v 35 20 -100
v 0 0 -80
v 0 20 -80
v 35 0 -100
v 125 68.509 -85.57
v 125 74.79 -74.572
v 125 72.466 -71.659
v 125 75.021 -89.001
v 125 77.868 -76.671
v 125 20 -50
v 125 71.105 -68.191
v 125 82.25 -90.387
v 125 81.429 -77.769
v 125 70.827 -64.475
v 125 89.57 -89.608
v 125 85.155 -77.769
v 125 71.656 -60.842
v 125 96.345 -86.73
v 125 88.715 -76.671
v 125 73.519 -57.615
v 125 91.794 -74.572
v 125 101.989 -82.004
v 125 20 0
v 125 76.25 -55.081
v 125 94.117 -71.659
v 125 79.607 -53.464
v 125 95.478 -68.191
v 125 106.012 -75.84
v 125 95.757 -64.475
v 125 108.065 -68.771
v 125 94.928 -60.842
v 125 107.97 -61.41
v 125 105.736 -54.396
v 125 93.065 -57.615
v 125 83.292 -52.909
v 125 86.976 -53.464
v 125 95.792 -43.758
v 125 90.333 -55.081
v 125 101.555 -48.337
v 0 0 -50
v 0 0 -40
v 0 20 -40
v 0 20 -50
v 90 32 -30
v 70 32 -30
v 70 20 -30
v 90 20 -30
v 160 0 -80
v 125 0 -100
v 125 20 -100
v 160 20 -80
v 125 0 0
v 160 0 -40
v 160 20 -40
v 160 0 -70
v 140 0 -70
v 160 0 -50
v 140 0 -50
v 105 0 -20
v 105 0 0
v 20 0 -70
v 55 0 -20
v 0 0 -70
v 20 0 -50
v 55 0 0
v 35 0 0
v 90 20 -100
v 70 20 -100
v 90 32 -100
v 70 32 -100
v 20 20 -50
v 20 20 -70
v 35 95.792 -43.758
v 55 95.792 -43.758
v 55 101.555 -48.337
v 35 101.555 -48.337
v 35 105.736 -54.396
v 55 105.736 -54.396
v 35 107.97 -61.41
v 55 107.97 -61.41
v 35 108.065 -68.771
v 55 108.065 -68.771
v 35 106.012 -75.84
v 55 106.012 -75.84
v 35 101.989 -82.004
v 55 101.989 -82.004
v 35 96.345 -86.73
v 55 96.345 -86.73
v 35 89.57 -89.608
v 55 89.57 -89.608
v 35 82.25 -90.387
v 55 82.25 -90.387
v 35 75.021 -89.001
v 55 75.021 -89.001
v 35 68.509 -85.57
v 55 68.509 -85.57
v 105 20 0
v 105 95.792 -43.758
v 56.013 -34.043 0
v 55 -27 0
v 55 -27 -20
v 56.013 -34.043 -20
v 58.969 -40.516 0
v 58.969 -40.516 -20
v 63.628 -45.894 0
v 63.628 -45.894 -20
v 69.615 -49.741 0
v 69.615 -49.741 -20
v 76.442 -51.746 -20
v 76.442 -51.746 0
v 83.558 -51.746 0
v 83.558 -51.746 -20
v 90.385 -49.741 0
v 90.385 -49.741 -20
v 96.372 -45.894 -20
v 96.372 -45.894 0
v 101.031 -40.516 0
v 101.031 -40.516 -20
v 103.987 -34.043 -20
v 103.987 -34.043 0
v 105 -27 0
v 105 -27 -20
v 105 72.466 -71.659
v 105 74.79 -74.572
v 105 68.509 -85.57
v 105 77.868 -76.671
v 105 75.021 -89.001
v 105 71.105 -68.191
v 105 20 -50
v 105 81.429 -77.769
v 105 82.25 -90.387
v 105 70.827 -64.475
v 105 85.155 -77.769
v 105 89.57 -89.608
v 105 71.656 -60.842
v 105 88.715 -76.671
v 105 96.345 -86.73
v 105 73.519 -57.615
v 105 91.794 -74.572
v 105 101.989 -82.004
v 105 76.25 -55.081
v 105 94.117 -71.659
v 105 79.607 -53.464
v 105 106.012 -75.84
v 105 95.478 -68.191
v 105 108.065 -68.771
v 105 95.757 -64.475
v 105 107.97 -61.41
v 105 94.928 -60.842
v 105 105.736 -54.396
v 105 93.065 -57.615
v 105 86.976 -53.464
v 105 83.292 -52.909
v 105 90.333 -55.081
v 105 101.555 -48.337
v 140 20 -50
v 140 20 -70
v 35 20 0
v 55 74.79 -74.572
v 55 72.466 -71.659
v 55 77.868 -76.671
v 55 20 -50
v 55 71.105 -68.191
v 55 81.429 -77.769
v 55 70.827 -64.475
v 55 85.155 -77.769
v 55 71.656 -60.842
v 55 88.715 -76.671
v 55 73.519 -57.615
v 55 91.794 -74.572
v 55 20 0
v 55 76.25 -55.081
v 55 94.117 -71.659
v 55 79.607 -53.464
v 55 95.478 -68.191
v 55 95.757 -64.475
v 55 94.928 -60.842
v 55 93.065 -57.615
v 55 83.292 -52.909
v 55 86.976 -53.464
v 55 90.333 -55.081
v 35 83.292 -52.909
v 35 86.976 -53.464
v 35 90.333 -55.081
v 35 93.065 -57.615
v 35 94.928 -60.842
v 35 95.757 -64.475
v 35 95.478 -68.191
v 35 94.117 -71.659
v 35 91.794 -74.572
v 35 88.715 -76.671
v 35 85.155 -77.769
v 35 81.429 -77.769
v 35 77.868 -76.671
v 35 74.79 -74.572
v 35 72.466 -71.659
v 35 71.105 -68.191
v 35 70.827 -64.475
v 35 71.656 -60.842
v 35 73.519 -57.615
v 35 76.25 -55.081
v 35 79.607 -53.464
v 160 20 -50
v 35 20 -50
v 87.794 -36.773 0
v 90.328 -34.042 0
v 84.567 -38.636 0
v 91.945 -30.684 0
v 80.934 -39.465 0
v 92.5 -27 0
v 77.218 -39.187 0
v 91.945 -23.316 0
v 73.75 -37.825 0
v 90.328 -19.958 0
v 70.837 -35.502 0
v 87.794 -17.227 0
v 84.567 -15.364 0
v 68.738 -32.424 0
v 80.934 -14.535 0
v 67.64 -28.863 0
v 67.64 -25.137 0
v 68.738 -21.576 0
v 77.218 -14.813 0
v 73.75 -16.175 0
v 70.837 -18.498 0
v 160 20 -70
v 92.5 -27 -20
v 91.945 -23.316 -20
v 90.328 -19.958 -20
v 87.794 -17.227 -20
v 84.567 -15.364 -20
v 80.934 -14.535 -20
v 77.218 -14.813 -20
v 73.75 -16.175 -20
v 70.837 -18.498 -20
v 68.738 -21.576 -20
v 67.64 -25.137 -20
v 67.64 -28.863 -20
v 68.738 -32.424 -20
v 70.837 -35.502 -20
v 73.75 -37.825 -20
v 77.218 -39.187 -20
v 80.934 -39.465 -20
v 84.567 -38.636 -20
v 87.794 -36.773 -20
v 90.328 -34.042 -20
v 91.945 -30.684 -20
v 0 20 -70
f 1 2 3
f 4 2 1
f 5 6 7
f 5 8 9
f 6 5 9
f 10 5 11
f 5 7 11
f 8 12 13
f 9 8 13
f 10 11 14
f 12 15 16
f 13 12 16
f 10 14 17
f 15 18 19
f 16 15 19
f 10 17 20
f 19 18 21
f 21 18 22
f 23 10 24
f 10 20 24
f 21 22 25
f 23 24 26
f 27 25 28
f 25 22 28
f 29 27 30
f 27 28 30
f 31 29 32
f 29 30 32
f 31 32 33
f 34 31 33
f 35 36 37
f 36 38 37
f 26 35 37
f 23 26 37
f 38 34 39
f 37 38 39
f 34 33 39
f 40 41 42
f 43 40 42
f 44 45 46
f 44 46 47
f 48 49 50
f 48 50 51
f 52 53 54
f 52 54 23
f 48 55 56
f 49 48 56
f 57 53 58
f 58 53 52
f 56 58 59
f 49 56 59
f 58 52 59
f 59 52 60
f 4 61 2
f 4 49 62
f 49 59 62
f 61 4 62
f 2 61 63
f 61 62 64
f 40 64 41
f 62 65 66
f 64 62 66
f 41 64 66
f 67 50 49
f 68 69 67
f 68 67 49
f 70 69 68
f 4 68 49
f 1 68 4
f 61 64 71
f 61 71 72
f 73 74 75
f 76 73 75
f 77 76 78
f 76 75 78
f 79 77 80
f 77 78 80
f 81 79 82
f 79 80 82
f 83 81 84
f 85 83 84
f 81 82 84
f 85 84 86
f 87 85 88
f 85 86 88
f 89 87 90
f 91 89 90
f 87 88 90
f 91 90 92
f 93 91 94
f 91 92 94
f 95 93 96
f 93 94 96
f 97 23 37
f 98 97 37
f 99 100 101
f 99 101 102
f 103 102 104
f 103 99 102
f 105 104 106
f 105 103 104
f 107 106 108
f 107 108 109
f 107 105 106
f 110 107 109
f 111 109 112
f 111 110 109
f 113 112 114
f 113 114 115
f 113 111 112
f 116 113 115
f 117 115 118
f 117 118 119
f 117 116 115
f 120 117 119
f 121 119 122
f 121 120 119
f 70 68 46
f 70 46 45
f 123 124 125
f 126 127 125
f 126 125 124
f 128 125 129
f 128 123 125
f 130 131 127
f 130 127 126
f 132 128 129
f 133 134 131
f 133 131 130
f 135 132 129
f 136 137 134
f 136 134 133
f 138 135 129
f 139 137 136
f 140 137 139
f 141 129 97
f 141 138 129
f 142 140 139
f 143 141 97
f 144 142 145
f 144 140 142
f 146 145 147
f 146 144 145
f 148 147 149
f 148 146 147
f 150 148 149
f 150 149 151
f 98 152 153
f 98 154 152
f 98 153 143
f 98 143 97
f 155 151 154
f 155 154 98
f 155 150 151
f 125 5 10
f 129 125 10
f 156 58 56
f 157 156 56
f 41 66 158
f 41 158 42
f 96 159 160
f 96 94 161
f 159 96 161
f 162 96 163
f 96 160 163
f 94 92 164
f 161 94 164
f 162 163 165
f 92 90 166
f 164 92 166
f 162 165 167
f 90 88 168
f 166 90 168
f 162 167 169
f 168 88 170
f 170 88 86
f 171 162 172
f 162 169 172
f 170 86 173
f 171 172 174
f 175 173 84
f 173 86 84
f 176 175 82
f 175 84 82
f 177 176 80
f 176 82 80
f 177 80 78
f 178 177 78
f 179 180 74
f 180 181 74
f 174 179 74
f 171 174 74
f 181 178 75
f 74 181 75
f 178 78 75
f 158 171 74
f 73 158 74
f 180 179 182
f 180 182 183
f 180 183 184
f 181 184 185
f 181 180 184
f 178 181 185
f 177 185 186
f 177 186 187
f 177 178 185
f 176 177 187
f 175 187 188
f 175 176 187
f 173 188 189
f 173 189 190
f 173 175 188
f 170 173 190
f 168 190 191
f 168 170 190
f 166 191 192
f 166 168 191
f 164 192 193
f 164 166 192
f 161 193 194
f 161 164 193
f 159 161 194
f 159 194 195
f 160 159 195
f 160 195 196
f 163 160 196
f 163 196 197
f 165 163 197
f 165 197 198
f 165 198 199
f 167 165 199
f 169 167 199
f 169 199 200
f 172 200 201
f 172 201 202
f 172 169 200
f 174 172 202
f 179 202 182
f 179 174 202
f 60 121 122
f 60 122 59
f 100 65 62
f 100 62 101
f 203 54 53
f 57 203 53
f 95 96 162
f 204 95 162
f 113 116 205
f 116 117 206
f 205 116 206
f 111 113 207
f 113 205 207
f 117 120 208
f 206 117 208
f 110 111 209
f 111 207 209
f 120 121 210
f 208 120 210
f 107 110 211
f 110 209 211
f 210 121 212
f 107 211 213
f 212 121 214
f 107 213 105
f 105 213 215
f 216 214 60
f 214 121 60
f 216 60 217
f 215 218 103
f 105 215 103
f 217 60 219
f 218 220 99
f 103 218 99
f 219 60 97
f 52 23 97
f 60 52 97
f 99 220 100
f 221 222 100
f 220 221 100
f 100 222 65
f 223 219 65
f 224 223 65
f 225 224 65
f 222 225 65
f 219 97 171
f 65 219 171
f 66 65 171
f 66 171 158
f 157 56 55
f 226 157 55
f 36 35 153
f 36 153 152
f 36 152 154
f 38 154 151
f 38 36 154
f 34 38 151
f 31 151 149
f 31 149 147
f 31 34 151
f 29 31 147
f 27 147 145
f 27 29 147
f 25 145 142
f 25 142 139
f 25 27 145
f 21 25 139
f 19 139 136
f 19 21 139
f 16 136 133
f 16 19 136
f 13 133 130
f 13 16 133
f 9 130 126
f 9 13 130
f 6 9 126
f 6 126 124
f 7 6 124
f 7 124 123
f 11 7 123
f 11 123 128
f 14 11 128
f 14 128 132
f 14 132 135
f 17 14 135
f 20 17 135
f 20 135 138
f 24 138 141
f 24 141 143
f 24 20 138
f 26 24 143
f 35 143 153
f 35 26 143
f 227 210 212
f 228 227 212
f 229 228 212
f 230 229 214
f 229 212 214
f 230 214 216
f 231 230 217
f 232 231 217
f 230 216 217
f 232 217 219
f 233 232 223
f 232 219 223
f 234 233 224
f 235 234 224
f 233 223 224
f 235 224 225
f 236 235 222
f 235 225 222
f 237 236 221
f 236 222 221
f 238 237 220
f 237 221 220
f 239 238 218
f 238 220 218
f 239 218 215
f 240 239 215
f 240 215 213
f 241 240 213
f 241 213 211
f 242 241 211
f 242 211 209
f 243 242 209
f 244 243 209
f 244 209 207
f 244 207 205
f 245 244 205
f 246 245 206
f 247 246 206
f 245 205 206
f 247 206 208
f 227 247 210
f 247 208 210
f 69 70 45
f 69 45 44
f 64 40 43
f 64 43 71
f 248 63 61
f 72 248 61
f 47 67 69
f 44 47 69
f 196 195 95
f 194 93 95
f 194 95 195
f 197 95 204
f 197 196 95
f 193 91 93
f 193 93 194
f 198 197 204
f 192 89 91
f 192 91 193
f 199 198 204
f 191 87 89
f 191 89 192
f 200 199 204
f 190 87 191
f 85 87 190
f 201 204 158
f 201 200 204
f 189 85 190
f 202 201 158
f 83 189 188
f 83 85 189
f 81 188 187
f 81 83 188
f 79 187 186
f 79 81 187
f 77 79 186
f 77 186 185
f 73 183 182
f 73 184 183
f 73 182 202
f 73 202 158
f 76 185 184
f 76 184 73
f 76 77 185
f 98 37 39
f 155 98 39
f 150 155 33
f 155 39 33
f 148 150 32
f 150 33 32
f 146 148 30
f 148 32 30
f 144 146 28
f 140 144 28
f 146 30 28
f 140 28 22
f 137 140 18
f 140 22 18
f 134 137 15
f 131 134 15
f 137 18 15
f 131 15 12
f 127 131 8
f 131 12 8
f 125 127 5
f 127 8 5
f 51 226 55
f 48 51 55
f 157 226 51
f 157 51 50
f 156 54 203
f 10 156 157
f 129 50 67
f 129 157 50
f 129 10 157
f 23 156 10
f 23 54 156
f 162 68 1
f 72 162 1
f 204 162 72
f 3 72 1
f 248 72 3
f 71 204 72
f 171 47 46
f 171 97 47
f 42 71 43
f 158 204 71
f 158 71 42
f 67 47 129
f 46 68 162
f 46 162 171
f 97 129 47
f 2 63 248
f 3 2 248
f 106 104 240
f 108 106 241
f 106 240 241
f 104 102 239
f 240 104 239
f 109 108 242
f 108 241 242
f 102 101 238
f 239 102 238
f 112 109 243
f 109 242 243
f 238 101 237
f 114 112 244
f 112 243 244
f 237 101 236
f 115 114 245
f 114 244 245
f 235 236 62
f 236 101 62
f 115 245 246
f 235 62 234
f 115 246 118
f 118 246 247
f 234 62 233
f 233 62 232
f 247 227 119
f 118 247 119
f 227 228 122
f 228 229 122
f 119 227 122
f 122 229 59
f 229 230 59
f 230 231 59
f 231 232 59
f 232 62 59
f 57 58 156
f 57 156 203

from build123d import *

# Parameters (mm, degrees)
BOSS_EXTRUDE1_DEPTH     = 100
SKETCH1_3_R             = 12.5
BOSS_EXTRUDE2_DEPTH     = 20
BOSS_EXTRUDE3_START     = -100
SKETCH1_4_W             = 20
SKETCH1_4_H             = 12
BOSS_EXTRUDE3_DEPTH     = 70
BOSS_EXTRUDE4_START     = -55
SKETCH2_R               = 12.5
BOSS_EXTRUDE4_DEPTH     = 20
BOSS_EXTRUDE5_START     = -125
SKETCH2_3_R             = 12.5
BOSS_EXTRUDE5_DEPTH     = 20
CUT_EXTRUDE1_DEPTH      = 209.315712821
CUT_EXTRUDE1_DEPTH_BACK = 209.315712821
SKETCH4_W               = 20
SKETCH4_H               = 20


with BuildPart() as part:
    # Sketch1 → Boss-Extrude1 (new body)
    with BuildSketch(Plane.XY):
        Polygon((105, 20), (125, 20), (160, 20), (160, 0), (0, 0), (0, 20), (35, 20), (55, 20), align=None)
    extrude(amount=-BOSS_EXTRUDE1_DEPTH)

    # Sketch1<3> → Boss-Extrude2 (add)
    with BuildSketch(Plane.XY):
        with BuildLine():
            Line((105, 0), (55, 0))
            Line((55, 0), (55, -27))
            ThreePointArc((55, -27), (80, -52), (105, -27))
            Line((105, -27), (105, 0))
        make_face()
        with Locations((80, -27)):
            Circle(SKETCH1_3_R, mode=Mode.SUBTRACT)
    extrude(amount=-BOSS_EXTRUDE2_DEPTH)

    # Sketch1<4> → Boss-Extrude3 (add)
    with BuildSketch(Plane.XY.offset(BOSS_EXTRUDE3_START)):
        with Locations((80, 26)):
            Rectangle(SKETCH1_4_W, SKETCH1_4_H)
    extrude(amount=BOSS_EXTRUDE3_DEPTH)

    # Sketch2 → Boss-Extrude4 (add)
    with BuildSketch(Plane.ZY.offset(BOSS_EXTRUDE4_START)):
        with BuildLine():
            Line((0, 20), (-43.758397368, 95.791767499))
            ThreePointArc((-43.758397368, 95.791767499), (-79.070979034, 104.228606226), (-85.569779349, 68.508524114))
            Line((-85.569779349, 68.508524114), (-50, 20))
            Line((-50, 20), (0, 20))
        make_face()
        with Locations((-65.409032463, 83.291767499)):
            Circle(SKETCH2_R, mode=Mode.SUBTRACT)
    extrude(amount=BOSS_EXTRUDE4_DEPTH)

    # Sketch2<3> → Boss-Extrude5 (add)
    with BuildSketch(Plane.ZY.offset(BOSS_EXTRUDE5_START)):
        with BuildLine():
            Line((0, 20), (-43.758397368, 95.791767499))
            ThreePointArc((-43.758397368, 95.791767499), (-79.070979034, 104.228606226), (-85.569779349, 68.508524114))
            Line((-85.569779349, 68.508524114), (-50, 20))
            Line((-50, 20), (0, 20))
        make_face()
        with Locations((-65.409032463, 83.291767499)):
            Circle(SKETCH2_3_R, mode=Mode.SUBTRACT)
    extrude(amount=BOSS_EXTRUDE5_DEPTH)

    # Sketch4 → Cut-Extrude1 (cut, two sides: drawn at the far end of the back side and taken through both)
    with BuildSketch(Plane(origin=(0, 20, 0), x_dir=(1, 0, 0), z_dir=(0, 1, 0)).offset(-CUT_EXTRUDE1_DEPTH_BACK)):
        Polygon((0, 100), (0, 80), (35, 100), align=None)
        Polygon((0, 0), (35, 0), (0, 40), align=None)
        Polygon((160, 40), (125, 0), (160, 0), align=None)
        Polygon((125, 100), (160, 80), (160, 100), align=None)
        with Locations((150, 60)):
            Rectangle(SKETCH4_W, SKETCH4_H)
        with Locations((10, 60)):
            Rectangle(SKETCH4_W, SKETCH4_H)
    extrude(amount=CUT_EXTRUDE1_DEPTH + CUT_EXTRUDE1_DEPTH_BACK, mode=Mode.SUBTRACT)


solid = part.part
